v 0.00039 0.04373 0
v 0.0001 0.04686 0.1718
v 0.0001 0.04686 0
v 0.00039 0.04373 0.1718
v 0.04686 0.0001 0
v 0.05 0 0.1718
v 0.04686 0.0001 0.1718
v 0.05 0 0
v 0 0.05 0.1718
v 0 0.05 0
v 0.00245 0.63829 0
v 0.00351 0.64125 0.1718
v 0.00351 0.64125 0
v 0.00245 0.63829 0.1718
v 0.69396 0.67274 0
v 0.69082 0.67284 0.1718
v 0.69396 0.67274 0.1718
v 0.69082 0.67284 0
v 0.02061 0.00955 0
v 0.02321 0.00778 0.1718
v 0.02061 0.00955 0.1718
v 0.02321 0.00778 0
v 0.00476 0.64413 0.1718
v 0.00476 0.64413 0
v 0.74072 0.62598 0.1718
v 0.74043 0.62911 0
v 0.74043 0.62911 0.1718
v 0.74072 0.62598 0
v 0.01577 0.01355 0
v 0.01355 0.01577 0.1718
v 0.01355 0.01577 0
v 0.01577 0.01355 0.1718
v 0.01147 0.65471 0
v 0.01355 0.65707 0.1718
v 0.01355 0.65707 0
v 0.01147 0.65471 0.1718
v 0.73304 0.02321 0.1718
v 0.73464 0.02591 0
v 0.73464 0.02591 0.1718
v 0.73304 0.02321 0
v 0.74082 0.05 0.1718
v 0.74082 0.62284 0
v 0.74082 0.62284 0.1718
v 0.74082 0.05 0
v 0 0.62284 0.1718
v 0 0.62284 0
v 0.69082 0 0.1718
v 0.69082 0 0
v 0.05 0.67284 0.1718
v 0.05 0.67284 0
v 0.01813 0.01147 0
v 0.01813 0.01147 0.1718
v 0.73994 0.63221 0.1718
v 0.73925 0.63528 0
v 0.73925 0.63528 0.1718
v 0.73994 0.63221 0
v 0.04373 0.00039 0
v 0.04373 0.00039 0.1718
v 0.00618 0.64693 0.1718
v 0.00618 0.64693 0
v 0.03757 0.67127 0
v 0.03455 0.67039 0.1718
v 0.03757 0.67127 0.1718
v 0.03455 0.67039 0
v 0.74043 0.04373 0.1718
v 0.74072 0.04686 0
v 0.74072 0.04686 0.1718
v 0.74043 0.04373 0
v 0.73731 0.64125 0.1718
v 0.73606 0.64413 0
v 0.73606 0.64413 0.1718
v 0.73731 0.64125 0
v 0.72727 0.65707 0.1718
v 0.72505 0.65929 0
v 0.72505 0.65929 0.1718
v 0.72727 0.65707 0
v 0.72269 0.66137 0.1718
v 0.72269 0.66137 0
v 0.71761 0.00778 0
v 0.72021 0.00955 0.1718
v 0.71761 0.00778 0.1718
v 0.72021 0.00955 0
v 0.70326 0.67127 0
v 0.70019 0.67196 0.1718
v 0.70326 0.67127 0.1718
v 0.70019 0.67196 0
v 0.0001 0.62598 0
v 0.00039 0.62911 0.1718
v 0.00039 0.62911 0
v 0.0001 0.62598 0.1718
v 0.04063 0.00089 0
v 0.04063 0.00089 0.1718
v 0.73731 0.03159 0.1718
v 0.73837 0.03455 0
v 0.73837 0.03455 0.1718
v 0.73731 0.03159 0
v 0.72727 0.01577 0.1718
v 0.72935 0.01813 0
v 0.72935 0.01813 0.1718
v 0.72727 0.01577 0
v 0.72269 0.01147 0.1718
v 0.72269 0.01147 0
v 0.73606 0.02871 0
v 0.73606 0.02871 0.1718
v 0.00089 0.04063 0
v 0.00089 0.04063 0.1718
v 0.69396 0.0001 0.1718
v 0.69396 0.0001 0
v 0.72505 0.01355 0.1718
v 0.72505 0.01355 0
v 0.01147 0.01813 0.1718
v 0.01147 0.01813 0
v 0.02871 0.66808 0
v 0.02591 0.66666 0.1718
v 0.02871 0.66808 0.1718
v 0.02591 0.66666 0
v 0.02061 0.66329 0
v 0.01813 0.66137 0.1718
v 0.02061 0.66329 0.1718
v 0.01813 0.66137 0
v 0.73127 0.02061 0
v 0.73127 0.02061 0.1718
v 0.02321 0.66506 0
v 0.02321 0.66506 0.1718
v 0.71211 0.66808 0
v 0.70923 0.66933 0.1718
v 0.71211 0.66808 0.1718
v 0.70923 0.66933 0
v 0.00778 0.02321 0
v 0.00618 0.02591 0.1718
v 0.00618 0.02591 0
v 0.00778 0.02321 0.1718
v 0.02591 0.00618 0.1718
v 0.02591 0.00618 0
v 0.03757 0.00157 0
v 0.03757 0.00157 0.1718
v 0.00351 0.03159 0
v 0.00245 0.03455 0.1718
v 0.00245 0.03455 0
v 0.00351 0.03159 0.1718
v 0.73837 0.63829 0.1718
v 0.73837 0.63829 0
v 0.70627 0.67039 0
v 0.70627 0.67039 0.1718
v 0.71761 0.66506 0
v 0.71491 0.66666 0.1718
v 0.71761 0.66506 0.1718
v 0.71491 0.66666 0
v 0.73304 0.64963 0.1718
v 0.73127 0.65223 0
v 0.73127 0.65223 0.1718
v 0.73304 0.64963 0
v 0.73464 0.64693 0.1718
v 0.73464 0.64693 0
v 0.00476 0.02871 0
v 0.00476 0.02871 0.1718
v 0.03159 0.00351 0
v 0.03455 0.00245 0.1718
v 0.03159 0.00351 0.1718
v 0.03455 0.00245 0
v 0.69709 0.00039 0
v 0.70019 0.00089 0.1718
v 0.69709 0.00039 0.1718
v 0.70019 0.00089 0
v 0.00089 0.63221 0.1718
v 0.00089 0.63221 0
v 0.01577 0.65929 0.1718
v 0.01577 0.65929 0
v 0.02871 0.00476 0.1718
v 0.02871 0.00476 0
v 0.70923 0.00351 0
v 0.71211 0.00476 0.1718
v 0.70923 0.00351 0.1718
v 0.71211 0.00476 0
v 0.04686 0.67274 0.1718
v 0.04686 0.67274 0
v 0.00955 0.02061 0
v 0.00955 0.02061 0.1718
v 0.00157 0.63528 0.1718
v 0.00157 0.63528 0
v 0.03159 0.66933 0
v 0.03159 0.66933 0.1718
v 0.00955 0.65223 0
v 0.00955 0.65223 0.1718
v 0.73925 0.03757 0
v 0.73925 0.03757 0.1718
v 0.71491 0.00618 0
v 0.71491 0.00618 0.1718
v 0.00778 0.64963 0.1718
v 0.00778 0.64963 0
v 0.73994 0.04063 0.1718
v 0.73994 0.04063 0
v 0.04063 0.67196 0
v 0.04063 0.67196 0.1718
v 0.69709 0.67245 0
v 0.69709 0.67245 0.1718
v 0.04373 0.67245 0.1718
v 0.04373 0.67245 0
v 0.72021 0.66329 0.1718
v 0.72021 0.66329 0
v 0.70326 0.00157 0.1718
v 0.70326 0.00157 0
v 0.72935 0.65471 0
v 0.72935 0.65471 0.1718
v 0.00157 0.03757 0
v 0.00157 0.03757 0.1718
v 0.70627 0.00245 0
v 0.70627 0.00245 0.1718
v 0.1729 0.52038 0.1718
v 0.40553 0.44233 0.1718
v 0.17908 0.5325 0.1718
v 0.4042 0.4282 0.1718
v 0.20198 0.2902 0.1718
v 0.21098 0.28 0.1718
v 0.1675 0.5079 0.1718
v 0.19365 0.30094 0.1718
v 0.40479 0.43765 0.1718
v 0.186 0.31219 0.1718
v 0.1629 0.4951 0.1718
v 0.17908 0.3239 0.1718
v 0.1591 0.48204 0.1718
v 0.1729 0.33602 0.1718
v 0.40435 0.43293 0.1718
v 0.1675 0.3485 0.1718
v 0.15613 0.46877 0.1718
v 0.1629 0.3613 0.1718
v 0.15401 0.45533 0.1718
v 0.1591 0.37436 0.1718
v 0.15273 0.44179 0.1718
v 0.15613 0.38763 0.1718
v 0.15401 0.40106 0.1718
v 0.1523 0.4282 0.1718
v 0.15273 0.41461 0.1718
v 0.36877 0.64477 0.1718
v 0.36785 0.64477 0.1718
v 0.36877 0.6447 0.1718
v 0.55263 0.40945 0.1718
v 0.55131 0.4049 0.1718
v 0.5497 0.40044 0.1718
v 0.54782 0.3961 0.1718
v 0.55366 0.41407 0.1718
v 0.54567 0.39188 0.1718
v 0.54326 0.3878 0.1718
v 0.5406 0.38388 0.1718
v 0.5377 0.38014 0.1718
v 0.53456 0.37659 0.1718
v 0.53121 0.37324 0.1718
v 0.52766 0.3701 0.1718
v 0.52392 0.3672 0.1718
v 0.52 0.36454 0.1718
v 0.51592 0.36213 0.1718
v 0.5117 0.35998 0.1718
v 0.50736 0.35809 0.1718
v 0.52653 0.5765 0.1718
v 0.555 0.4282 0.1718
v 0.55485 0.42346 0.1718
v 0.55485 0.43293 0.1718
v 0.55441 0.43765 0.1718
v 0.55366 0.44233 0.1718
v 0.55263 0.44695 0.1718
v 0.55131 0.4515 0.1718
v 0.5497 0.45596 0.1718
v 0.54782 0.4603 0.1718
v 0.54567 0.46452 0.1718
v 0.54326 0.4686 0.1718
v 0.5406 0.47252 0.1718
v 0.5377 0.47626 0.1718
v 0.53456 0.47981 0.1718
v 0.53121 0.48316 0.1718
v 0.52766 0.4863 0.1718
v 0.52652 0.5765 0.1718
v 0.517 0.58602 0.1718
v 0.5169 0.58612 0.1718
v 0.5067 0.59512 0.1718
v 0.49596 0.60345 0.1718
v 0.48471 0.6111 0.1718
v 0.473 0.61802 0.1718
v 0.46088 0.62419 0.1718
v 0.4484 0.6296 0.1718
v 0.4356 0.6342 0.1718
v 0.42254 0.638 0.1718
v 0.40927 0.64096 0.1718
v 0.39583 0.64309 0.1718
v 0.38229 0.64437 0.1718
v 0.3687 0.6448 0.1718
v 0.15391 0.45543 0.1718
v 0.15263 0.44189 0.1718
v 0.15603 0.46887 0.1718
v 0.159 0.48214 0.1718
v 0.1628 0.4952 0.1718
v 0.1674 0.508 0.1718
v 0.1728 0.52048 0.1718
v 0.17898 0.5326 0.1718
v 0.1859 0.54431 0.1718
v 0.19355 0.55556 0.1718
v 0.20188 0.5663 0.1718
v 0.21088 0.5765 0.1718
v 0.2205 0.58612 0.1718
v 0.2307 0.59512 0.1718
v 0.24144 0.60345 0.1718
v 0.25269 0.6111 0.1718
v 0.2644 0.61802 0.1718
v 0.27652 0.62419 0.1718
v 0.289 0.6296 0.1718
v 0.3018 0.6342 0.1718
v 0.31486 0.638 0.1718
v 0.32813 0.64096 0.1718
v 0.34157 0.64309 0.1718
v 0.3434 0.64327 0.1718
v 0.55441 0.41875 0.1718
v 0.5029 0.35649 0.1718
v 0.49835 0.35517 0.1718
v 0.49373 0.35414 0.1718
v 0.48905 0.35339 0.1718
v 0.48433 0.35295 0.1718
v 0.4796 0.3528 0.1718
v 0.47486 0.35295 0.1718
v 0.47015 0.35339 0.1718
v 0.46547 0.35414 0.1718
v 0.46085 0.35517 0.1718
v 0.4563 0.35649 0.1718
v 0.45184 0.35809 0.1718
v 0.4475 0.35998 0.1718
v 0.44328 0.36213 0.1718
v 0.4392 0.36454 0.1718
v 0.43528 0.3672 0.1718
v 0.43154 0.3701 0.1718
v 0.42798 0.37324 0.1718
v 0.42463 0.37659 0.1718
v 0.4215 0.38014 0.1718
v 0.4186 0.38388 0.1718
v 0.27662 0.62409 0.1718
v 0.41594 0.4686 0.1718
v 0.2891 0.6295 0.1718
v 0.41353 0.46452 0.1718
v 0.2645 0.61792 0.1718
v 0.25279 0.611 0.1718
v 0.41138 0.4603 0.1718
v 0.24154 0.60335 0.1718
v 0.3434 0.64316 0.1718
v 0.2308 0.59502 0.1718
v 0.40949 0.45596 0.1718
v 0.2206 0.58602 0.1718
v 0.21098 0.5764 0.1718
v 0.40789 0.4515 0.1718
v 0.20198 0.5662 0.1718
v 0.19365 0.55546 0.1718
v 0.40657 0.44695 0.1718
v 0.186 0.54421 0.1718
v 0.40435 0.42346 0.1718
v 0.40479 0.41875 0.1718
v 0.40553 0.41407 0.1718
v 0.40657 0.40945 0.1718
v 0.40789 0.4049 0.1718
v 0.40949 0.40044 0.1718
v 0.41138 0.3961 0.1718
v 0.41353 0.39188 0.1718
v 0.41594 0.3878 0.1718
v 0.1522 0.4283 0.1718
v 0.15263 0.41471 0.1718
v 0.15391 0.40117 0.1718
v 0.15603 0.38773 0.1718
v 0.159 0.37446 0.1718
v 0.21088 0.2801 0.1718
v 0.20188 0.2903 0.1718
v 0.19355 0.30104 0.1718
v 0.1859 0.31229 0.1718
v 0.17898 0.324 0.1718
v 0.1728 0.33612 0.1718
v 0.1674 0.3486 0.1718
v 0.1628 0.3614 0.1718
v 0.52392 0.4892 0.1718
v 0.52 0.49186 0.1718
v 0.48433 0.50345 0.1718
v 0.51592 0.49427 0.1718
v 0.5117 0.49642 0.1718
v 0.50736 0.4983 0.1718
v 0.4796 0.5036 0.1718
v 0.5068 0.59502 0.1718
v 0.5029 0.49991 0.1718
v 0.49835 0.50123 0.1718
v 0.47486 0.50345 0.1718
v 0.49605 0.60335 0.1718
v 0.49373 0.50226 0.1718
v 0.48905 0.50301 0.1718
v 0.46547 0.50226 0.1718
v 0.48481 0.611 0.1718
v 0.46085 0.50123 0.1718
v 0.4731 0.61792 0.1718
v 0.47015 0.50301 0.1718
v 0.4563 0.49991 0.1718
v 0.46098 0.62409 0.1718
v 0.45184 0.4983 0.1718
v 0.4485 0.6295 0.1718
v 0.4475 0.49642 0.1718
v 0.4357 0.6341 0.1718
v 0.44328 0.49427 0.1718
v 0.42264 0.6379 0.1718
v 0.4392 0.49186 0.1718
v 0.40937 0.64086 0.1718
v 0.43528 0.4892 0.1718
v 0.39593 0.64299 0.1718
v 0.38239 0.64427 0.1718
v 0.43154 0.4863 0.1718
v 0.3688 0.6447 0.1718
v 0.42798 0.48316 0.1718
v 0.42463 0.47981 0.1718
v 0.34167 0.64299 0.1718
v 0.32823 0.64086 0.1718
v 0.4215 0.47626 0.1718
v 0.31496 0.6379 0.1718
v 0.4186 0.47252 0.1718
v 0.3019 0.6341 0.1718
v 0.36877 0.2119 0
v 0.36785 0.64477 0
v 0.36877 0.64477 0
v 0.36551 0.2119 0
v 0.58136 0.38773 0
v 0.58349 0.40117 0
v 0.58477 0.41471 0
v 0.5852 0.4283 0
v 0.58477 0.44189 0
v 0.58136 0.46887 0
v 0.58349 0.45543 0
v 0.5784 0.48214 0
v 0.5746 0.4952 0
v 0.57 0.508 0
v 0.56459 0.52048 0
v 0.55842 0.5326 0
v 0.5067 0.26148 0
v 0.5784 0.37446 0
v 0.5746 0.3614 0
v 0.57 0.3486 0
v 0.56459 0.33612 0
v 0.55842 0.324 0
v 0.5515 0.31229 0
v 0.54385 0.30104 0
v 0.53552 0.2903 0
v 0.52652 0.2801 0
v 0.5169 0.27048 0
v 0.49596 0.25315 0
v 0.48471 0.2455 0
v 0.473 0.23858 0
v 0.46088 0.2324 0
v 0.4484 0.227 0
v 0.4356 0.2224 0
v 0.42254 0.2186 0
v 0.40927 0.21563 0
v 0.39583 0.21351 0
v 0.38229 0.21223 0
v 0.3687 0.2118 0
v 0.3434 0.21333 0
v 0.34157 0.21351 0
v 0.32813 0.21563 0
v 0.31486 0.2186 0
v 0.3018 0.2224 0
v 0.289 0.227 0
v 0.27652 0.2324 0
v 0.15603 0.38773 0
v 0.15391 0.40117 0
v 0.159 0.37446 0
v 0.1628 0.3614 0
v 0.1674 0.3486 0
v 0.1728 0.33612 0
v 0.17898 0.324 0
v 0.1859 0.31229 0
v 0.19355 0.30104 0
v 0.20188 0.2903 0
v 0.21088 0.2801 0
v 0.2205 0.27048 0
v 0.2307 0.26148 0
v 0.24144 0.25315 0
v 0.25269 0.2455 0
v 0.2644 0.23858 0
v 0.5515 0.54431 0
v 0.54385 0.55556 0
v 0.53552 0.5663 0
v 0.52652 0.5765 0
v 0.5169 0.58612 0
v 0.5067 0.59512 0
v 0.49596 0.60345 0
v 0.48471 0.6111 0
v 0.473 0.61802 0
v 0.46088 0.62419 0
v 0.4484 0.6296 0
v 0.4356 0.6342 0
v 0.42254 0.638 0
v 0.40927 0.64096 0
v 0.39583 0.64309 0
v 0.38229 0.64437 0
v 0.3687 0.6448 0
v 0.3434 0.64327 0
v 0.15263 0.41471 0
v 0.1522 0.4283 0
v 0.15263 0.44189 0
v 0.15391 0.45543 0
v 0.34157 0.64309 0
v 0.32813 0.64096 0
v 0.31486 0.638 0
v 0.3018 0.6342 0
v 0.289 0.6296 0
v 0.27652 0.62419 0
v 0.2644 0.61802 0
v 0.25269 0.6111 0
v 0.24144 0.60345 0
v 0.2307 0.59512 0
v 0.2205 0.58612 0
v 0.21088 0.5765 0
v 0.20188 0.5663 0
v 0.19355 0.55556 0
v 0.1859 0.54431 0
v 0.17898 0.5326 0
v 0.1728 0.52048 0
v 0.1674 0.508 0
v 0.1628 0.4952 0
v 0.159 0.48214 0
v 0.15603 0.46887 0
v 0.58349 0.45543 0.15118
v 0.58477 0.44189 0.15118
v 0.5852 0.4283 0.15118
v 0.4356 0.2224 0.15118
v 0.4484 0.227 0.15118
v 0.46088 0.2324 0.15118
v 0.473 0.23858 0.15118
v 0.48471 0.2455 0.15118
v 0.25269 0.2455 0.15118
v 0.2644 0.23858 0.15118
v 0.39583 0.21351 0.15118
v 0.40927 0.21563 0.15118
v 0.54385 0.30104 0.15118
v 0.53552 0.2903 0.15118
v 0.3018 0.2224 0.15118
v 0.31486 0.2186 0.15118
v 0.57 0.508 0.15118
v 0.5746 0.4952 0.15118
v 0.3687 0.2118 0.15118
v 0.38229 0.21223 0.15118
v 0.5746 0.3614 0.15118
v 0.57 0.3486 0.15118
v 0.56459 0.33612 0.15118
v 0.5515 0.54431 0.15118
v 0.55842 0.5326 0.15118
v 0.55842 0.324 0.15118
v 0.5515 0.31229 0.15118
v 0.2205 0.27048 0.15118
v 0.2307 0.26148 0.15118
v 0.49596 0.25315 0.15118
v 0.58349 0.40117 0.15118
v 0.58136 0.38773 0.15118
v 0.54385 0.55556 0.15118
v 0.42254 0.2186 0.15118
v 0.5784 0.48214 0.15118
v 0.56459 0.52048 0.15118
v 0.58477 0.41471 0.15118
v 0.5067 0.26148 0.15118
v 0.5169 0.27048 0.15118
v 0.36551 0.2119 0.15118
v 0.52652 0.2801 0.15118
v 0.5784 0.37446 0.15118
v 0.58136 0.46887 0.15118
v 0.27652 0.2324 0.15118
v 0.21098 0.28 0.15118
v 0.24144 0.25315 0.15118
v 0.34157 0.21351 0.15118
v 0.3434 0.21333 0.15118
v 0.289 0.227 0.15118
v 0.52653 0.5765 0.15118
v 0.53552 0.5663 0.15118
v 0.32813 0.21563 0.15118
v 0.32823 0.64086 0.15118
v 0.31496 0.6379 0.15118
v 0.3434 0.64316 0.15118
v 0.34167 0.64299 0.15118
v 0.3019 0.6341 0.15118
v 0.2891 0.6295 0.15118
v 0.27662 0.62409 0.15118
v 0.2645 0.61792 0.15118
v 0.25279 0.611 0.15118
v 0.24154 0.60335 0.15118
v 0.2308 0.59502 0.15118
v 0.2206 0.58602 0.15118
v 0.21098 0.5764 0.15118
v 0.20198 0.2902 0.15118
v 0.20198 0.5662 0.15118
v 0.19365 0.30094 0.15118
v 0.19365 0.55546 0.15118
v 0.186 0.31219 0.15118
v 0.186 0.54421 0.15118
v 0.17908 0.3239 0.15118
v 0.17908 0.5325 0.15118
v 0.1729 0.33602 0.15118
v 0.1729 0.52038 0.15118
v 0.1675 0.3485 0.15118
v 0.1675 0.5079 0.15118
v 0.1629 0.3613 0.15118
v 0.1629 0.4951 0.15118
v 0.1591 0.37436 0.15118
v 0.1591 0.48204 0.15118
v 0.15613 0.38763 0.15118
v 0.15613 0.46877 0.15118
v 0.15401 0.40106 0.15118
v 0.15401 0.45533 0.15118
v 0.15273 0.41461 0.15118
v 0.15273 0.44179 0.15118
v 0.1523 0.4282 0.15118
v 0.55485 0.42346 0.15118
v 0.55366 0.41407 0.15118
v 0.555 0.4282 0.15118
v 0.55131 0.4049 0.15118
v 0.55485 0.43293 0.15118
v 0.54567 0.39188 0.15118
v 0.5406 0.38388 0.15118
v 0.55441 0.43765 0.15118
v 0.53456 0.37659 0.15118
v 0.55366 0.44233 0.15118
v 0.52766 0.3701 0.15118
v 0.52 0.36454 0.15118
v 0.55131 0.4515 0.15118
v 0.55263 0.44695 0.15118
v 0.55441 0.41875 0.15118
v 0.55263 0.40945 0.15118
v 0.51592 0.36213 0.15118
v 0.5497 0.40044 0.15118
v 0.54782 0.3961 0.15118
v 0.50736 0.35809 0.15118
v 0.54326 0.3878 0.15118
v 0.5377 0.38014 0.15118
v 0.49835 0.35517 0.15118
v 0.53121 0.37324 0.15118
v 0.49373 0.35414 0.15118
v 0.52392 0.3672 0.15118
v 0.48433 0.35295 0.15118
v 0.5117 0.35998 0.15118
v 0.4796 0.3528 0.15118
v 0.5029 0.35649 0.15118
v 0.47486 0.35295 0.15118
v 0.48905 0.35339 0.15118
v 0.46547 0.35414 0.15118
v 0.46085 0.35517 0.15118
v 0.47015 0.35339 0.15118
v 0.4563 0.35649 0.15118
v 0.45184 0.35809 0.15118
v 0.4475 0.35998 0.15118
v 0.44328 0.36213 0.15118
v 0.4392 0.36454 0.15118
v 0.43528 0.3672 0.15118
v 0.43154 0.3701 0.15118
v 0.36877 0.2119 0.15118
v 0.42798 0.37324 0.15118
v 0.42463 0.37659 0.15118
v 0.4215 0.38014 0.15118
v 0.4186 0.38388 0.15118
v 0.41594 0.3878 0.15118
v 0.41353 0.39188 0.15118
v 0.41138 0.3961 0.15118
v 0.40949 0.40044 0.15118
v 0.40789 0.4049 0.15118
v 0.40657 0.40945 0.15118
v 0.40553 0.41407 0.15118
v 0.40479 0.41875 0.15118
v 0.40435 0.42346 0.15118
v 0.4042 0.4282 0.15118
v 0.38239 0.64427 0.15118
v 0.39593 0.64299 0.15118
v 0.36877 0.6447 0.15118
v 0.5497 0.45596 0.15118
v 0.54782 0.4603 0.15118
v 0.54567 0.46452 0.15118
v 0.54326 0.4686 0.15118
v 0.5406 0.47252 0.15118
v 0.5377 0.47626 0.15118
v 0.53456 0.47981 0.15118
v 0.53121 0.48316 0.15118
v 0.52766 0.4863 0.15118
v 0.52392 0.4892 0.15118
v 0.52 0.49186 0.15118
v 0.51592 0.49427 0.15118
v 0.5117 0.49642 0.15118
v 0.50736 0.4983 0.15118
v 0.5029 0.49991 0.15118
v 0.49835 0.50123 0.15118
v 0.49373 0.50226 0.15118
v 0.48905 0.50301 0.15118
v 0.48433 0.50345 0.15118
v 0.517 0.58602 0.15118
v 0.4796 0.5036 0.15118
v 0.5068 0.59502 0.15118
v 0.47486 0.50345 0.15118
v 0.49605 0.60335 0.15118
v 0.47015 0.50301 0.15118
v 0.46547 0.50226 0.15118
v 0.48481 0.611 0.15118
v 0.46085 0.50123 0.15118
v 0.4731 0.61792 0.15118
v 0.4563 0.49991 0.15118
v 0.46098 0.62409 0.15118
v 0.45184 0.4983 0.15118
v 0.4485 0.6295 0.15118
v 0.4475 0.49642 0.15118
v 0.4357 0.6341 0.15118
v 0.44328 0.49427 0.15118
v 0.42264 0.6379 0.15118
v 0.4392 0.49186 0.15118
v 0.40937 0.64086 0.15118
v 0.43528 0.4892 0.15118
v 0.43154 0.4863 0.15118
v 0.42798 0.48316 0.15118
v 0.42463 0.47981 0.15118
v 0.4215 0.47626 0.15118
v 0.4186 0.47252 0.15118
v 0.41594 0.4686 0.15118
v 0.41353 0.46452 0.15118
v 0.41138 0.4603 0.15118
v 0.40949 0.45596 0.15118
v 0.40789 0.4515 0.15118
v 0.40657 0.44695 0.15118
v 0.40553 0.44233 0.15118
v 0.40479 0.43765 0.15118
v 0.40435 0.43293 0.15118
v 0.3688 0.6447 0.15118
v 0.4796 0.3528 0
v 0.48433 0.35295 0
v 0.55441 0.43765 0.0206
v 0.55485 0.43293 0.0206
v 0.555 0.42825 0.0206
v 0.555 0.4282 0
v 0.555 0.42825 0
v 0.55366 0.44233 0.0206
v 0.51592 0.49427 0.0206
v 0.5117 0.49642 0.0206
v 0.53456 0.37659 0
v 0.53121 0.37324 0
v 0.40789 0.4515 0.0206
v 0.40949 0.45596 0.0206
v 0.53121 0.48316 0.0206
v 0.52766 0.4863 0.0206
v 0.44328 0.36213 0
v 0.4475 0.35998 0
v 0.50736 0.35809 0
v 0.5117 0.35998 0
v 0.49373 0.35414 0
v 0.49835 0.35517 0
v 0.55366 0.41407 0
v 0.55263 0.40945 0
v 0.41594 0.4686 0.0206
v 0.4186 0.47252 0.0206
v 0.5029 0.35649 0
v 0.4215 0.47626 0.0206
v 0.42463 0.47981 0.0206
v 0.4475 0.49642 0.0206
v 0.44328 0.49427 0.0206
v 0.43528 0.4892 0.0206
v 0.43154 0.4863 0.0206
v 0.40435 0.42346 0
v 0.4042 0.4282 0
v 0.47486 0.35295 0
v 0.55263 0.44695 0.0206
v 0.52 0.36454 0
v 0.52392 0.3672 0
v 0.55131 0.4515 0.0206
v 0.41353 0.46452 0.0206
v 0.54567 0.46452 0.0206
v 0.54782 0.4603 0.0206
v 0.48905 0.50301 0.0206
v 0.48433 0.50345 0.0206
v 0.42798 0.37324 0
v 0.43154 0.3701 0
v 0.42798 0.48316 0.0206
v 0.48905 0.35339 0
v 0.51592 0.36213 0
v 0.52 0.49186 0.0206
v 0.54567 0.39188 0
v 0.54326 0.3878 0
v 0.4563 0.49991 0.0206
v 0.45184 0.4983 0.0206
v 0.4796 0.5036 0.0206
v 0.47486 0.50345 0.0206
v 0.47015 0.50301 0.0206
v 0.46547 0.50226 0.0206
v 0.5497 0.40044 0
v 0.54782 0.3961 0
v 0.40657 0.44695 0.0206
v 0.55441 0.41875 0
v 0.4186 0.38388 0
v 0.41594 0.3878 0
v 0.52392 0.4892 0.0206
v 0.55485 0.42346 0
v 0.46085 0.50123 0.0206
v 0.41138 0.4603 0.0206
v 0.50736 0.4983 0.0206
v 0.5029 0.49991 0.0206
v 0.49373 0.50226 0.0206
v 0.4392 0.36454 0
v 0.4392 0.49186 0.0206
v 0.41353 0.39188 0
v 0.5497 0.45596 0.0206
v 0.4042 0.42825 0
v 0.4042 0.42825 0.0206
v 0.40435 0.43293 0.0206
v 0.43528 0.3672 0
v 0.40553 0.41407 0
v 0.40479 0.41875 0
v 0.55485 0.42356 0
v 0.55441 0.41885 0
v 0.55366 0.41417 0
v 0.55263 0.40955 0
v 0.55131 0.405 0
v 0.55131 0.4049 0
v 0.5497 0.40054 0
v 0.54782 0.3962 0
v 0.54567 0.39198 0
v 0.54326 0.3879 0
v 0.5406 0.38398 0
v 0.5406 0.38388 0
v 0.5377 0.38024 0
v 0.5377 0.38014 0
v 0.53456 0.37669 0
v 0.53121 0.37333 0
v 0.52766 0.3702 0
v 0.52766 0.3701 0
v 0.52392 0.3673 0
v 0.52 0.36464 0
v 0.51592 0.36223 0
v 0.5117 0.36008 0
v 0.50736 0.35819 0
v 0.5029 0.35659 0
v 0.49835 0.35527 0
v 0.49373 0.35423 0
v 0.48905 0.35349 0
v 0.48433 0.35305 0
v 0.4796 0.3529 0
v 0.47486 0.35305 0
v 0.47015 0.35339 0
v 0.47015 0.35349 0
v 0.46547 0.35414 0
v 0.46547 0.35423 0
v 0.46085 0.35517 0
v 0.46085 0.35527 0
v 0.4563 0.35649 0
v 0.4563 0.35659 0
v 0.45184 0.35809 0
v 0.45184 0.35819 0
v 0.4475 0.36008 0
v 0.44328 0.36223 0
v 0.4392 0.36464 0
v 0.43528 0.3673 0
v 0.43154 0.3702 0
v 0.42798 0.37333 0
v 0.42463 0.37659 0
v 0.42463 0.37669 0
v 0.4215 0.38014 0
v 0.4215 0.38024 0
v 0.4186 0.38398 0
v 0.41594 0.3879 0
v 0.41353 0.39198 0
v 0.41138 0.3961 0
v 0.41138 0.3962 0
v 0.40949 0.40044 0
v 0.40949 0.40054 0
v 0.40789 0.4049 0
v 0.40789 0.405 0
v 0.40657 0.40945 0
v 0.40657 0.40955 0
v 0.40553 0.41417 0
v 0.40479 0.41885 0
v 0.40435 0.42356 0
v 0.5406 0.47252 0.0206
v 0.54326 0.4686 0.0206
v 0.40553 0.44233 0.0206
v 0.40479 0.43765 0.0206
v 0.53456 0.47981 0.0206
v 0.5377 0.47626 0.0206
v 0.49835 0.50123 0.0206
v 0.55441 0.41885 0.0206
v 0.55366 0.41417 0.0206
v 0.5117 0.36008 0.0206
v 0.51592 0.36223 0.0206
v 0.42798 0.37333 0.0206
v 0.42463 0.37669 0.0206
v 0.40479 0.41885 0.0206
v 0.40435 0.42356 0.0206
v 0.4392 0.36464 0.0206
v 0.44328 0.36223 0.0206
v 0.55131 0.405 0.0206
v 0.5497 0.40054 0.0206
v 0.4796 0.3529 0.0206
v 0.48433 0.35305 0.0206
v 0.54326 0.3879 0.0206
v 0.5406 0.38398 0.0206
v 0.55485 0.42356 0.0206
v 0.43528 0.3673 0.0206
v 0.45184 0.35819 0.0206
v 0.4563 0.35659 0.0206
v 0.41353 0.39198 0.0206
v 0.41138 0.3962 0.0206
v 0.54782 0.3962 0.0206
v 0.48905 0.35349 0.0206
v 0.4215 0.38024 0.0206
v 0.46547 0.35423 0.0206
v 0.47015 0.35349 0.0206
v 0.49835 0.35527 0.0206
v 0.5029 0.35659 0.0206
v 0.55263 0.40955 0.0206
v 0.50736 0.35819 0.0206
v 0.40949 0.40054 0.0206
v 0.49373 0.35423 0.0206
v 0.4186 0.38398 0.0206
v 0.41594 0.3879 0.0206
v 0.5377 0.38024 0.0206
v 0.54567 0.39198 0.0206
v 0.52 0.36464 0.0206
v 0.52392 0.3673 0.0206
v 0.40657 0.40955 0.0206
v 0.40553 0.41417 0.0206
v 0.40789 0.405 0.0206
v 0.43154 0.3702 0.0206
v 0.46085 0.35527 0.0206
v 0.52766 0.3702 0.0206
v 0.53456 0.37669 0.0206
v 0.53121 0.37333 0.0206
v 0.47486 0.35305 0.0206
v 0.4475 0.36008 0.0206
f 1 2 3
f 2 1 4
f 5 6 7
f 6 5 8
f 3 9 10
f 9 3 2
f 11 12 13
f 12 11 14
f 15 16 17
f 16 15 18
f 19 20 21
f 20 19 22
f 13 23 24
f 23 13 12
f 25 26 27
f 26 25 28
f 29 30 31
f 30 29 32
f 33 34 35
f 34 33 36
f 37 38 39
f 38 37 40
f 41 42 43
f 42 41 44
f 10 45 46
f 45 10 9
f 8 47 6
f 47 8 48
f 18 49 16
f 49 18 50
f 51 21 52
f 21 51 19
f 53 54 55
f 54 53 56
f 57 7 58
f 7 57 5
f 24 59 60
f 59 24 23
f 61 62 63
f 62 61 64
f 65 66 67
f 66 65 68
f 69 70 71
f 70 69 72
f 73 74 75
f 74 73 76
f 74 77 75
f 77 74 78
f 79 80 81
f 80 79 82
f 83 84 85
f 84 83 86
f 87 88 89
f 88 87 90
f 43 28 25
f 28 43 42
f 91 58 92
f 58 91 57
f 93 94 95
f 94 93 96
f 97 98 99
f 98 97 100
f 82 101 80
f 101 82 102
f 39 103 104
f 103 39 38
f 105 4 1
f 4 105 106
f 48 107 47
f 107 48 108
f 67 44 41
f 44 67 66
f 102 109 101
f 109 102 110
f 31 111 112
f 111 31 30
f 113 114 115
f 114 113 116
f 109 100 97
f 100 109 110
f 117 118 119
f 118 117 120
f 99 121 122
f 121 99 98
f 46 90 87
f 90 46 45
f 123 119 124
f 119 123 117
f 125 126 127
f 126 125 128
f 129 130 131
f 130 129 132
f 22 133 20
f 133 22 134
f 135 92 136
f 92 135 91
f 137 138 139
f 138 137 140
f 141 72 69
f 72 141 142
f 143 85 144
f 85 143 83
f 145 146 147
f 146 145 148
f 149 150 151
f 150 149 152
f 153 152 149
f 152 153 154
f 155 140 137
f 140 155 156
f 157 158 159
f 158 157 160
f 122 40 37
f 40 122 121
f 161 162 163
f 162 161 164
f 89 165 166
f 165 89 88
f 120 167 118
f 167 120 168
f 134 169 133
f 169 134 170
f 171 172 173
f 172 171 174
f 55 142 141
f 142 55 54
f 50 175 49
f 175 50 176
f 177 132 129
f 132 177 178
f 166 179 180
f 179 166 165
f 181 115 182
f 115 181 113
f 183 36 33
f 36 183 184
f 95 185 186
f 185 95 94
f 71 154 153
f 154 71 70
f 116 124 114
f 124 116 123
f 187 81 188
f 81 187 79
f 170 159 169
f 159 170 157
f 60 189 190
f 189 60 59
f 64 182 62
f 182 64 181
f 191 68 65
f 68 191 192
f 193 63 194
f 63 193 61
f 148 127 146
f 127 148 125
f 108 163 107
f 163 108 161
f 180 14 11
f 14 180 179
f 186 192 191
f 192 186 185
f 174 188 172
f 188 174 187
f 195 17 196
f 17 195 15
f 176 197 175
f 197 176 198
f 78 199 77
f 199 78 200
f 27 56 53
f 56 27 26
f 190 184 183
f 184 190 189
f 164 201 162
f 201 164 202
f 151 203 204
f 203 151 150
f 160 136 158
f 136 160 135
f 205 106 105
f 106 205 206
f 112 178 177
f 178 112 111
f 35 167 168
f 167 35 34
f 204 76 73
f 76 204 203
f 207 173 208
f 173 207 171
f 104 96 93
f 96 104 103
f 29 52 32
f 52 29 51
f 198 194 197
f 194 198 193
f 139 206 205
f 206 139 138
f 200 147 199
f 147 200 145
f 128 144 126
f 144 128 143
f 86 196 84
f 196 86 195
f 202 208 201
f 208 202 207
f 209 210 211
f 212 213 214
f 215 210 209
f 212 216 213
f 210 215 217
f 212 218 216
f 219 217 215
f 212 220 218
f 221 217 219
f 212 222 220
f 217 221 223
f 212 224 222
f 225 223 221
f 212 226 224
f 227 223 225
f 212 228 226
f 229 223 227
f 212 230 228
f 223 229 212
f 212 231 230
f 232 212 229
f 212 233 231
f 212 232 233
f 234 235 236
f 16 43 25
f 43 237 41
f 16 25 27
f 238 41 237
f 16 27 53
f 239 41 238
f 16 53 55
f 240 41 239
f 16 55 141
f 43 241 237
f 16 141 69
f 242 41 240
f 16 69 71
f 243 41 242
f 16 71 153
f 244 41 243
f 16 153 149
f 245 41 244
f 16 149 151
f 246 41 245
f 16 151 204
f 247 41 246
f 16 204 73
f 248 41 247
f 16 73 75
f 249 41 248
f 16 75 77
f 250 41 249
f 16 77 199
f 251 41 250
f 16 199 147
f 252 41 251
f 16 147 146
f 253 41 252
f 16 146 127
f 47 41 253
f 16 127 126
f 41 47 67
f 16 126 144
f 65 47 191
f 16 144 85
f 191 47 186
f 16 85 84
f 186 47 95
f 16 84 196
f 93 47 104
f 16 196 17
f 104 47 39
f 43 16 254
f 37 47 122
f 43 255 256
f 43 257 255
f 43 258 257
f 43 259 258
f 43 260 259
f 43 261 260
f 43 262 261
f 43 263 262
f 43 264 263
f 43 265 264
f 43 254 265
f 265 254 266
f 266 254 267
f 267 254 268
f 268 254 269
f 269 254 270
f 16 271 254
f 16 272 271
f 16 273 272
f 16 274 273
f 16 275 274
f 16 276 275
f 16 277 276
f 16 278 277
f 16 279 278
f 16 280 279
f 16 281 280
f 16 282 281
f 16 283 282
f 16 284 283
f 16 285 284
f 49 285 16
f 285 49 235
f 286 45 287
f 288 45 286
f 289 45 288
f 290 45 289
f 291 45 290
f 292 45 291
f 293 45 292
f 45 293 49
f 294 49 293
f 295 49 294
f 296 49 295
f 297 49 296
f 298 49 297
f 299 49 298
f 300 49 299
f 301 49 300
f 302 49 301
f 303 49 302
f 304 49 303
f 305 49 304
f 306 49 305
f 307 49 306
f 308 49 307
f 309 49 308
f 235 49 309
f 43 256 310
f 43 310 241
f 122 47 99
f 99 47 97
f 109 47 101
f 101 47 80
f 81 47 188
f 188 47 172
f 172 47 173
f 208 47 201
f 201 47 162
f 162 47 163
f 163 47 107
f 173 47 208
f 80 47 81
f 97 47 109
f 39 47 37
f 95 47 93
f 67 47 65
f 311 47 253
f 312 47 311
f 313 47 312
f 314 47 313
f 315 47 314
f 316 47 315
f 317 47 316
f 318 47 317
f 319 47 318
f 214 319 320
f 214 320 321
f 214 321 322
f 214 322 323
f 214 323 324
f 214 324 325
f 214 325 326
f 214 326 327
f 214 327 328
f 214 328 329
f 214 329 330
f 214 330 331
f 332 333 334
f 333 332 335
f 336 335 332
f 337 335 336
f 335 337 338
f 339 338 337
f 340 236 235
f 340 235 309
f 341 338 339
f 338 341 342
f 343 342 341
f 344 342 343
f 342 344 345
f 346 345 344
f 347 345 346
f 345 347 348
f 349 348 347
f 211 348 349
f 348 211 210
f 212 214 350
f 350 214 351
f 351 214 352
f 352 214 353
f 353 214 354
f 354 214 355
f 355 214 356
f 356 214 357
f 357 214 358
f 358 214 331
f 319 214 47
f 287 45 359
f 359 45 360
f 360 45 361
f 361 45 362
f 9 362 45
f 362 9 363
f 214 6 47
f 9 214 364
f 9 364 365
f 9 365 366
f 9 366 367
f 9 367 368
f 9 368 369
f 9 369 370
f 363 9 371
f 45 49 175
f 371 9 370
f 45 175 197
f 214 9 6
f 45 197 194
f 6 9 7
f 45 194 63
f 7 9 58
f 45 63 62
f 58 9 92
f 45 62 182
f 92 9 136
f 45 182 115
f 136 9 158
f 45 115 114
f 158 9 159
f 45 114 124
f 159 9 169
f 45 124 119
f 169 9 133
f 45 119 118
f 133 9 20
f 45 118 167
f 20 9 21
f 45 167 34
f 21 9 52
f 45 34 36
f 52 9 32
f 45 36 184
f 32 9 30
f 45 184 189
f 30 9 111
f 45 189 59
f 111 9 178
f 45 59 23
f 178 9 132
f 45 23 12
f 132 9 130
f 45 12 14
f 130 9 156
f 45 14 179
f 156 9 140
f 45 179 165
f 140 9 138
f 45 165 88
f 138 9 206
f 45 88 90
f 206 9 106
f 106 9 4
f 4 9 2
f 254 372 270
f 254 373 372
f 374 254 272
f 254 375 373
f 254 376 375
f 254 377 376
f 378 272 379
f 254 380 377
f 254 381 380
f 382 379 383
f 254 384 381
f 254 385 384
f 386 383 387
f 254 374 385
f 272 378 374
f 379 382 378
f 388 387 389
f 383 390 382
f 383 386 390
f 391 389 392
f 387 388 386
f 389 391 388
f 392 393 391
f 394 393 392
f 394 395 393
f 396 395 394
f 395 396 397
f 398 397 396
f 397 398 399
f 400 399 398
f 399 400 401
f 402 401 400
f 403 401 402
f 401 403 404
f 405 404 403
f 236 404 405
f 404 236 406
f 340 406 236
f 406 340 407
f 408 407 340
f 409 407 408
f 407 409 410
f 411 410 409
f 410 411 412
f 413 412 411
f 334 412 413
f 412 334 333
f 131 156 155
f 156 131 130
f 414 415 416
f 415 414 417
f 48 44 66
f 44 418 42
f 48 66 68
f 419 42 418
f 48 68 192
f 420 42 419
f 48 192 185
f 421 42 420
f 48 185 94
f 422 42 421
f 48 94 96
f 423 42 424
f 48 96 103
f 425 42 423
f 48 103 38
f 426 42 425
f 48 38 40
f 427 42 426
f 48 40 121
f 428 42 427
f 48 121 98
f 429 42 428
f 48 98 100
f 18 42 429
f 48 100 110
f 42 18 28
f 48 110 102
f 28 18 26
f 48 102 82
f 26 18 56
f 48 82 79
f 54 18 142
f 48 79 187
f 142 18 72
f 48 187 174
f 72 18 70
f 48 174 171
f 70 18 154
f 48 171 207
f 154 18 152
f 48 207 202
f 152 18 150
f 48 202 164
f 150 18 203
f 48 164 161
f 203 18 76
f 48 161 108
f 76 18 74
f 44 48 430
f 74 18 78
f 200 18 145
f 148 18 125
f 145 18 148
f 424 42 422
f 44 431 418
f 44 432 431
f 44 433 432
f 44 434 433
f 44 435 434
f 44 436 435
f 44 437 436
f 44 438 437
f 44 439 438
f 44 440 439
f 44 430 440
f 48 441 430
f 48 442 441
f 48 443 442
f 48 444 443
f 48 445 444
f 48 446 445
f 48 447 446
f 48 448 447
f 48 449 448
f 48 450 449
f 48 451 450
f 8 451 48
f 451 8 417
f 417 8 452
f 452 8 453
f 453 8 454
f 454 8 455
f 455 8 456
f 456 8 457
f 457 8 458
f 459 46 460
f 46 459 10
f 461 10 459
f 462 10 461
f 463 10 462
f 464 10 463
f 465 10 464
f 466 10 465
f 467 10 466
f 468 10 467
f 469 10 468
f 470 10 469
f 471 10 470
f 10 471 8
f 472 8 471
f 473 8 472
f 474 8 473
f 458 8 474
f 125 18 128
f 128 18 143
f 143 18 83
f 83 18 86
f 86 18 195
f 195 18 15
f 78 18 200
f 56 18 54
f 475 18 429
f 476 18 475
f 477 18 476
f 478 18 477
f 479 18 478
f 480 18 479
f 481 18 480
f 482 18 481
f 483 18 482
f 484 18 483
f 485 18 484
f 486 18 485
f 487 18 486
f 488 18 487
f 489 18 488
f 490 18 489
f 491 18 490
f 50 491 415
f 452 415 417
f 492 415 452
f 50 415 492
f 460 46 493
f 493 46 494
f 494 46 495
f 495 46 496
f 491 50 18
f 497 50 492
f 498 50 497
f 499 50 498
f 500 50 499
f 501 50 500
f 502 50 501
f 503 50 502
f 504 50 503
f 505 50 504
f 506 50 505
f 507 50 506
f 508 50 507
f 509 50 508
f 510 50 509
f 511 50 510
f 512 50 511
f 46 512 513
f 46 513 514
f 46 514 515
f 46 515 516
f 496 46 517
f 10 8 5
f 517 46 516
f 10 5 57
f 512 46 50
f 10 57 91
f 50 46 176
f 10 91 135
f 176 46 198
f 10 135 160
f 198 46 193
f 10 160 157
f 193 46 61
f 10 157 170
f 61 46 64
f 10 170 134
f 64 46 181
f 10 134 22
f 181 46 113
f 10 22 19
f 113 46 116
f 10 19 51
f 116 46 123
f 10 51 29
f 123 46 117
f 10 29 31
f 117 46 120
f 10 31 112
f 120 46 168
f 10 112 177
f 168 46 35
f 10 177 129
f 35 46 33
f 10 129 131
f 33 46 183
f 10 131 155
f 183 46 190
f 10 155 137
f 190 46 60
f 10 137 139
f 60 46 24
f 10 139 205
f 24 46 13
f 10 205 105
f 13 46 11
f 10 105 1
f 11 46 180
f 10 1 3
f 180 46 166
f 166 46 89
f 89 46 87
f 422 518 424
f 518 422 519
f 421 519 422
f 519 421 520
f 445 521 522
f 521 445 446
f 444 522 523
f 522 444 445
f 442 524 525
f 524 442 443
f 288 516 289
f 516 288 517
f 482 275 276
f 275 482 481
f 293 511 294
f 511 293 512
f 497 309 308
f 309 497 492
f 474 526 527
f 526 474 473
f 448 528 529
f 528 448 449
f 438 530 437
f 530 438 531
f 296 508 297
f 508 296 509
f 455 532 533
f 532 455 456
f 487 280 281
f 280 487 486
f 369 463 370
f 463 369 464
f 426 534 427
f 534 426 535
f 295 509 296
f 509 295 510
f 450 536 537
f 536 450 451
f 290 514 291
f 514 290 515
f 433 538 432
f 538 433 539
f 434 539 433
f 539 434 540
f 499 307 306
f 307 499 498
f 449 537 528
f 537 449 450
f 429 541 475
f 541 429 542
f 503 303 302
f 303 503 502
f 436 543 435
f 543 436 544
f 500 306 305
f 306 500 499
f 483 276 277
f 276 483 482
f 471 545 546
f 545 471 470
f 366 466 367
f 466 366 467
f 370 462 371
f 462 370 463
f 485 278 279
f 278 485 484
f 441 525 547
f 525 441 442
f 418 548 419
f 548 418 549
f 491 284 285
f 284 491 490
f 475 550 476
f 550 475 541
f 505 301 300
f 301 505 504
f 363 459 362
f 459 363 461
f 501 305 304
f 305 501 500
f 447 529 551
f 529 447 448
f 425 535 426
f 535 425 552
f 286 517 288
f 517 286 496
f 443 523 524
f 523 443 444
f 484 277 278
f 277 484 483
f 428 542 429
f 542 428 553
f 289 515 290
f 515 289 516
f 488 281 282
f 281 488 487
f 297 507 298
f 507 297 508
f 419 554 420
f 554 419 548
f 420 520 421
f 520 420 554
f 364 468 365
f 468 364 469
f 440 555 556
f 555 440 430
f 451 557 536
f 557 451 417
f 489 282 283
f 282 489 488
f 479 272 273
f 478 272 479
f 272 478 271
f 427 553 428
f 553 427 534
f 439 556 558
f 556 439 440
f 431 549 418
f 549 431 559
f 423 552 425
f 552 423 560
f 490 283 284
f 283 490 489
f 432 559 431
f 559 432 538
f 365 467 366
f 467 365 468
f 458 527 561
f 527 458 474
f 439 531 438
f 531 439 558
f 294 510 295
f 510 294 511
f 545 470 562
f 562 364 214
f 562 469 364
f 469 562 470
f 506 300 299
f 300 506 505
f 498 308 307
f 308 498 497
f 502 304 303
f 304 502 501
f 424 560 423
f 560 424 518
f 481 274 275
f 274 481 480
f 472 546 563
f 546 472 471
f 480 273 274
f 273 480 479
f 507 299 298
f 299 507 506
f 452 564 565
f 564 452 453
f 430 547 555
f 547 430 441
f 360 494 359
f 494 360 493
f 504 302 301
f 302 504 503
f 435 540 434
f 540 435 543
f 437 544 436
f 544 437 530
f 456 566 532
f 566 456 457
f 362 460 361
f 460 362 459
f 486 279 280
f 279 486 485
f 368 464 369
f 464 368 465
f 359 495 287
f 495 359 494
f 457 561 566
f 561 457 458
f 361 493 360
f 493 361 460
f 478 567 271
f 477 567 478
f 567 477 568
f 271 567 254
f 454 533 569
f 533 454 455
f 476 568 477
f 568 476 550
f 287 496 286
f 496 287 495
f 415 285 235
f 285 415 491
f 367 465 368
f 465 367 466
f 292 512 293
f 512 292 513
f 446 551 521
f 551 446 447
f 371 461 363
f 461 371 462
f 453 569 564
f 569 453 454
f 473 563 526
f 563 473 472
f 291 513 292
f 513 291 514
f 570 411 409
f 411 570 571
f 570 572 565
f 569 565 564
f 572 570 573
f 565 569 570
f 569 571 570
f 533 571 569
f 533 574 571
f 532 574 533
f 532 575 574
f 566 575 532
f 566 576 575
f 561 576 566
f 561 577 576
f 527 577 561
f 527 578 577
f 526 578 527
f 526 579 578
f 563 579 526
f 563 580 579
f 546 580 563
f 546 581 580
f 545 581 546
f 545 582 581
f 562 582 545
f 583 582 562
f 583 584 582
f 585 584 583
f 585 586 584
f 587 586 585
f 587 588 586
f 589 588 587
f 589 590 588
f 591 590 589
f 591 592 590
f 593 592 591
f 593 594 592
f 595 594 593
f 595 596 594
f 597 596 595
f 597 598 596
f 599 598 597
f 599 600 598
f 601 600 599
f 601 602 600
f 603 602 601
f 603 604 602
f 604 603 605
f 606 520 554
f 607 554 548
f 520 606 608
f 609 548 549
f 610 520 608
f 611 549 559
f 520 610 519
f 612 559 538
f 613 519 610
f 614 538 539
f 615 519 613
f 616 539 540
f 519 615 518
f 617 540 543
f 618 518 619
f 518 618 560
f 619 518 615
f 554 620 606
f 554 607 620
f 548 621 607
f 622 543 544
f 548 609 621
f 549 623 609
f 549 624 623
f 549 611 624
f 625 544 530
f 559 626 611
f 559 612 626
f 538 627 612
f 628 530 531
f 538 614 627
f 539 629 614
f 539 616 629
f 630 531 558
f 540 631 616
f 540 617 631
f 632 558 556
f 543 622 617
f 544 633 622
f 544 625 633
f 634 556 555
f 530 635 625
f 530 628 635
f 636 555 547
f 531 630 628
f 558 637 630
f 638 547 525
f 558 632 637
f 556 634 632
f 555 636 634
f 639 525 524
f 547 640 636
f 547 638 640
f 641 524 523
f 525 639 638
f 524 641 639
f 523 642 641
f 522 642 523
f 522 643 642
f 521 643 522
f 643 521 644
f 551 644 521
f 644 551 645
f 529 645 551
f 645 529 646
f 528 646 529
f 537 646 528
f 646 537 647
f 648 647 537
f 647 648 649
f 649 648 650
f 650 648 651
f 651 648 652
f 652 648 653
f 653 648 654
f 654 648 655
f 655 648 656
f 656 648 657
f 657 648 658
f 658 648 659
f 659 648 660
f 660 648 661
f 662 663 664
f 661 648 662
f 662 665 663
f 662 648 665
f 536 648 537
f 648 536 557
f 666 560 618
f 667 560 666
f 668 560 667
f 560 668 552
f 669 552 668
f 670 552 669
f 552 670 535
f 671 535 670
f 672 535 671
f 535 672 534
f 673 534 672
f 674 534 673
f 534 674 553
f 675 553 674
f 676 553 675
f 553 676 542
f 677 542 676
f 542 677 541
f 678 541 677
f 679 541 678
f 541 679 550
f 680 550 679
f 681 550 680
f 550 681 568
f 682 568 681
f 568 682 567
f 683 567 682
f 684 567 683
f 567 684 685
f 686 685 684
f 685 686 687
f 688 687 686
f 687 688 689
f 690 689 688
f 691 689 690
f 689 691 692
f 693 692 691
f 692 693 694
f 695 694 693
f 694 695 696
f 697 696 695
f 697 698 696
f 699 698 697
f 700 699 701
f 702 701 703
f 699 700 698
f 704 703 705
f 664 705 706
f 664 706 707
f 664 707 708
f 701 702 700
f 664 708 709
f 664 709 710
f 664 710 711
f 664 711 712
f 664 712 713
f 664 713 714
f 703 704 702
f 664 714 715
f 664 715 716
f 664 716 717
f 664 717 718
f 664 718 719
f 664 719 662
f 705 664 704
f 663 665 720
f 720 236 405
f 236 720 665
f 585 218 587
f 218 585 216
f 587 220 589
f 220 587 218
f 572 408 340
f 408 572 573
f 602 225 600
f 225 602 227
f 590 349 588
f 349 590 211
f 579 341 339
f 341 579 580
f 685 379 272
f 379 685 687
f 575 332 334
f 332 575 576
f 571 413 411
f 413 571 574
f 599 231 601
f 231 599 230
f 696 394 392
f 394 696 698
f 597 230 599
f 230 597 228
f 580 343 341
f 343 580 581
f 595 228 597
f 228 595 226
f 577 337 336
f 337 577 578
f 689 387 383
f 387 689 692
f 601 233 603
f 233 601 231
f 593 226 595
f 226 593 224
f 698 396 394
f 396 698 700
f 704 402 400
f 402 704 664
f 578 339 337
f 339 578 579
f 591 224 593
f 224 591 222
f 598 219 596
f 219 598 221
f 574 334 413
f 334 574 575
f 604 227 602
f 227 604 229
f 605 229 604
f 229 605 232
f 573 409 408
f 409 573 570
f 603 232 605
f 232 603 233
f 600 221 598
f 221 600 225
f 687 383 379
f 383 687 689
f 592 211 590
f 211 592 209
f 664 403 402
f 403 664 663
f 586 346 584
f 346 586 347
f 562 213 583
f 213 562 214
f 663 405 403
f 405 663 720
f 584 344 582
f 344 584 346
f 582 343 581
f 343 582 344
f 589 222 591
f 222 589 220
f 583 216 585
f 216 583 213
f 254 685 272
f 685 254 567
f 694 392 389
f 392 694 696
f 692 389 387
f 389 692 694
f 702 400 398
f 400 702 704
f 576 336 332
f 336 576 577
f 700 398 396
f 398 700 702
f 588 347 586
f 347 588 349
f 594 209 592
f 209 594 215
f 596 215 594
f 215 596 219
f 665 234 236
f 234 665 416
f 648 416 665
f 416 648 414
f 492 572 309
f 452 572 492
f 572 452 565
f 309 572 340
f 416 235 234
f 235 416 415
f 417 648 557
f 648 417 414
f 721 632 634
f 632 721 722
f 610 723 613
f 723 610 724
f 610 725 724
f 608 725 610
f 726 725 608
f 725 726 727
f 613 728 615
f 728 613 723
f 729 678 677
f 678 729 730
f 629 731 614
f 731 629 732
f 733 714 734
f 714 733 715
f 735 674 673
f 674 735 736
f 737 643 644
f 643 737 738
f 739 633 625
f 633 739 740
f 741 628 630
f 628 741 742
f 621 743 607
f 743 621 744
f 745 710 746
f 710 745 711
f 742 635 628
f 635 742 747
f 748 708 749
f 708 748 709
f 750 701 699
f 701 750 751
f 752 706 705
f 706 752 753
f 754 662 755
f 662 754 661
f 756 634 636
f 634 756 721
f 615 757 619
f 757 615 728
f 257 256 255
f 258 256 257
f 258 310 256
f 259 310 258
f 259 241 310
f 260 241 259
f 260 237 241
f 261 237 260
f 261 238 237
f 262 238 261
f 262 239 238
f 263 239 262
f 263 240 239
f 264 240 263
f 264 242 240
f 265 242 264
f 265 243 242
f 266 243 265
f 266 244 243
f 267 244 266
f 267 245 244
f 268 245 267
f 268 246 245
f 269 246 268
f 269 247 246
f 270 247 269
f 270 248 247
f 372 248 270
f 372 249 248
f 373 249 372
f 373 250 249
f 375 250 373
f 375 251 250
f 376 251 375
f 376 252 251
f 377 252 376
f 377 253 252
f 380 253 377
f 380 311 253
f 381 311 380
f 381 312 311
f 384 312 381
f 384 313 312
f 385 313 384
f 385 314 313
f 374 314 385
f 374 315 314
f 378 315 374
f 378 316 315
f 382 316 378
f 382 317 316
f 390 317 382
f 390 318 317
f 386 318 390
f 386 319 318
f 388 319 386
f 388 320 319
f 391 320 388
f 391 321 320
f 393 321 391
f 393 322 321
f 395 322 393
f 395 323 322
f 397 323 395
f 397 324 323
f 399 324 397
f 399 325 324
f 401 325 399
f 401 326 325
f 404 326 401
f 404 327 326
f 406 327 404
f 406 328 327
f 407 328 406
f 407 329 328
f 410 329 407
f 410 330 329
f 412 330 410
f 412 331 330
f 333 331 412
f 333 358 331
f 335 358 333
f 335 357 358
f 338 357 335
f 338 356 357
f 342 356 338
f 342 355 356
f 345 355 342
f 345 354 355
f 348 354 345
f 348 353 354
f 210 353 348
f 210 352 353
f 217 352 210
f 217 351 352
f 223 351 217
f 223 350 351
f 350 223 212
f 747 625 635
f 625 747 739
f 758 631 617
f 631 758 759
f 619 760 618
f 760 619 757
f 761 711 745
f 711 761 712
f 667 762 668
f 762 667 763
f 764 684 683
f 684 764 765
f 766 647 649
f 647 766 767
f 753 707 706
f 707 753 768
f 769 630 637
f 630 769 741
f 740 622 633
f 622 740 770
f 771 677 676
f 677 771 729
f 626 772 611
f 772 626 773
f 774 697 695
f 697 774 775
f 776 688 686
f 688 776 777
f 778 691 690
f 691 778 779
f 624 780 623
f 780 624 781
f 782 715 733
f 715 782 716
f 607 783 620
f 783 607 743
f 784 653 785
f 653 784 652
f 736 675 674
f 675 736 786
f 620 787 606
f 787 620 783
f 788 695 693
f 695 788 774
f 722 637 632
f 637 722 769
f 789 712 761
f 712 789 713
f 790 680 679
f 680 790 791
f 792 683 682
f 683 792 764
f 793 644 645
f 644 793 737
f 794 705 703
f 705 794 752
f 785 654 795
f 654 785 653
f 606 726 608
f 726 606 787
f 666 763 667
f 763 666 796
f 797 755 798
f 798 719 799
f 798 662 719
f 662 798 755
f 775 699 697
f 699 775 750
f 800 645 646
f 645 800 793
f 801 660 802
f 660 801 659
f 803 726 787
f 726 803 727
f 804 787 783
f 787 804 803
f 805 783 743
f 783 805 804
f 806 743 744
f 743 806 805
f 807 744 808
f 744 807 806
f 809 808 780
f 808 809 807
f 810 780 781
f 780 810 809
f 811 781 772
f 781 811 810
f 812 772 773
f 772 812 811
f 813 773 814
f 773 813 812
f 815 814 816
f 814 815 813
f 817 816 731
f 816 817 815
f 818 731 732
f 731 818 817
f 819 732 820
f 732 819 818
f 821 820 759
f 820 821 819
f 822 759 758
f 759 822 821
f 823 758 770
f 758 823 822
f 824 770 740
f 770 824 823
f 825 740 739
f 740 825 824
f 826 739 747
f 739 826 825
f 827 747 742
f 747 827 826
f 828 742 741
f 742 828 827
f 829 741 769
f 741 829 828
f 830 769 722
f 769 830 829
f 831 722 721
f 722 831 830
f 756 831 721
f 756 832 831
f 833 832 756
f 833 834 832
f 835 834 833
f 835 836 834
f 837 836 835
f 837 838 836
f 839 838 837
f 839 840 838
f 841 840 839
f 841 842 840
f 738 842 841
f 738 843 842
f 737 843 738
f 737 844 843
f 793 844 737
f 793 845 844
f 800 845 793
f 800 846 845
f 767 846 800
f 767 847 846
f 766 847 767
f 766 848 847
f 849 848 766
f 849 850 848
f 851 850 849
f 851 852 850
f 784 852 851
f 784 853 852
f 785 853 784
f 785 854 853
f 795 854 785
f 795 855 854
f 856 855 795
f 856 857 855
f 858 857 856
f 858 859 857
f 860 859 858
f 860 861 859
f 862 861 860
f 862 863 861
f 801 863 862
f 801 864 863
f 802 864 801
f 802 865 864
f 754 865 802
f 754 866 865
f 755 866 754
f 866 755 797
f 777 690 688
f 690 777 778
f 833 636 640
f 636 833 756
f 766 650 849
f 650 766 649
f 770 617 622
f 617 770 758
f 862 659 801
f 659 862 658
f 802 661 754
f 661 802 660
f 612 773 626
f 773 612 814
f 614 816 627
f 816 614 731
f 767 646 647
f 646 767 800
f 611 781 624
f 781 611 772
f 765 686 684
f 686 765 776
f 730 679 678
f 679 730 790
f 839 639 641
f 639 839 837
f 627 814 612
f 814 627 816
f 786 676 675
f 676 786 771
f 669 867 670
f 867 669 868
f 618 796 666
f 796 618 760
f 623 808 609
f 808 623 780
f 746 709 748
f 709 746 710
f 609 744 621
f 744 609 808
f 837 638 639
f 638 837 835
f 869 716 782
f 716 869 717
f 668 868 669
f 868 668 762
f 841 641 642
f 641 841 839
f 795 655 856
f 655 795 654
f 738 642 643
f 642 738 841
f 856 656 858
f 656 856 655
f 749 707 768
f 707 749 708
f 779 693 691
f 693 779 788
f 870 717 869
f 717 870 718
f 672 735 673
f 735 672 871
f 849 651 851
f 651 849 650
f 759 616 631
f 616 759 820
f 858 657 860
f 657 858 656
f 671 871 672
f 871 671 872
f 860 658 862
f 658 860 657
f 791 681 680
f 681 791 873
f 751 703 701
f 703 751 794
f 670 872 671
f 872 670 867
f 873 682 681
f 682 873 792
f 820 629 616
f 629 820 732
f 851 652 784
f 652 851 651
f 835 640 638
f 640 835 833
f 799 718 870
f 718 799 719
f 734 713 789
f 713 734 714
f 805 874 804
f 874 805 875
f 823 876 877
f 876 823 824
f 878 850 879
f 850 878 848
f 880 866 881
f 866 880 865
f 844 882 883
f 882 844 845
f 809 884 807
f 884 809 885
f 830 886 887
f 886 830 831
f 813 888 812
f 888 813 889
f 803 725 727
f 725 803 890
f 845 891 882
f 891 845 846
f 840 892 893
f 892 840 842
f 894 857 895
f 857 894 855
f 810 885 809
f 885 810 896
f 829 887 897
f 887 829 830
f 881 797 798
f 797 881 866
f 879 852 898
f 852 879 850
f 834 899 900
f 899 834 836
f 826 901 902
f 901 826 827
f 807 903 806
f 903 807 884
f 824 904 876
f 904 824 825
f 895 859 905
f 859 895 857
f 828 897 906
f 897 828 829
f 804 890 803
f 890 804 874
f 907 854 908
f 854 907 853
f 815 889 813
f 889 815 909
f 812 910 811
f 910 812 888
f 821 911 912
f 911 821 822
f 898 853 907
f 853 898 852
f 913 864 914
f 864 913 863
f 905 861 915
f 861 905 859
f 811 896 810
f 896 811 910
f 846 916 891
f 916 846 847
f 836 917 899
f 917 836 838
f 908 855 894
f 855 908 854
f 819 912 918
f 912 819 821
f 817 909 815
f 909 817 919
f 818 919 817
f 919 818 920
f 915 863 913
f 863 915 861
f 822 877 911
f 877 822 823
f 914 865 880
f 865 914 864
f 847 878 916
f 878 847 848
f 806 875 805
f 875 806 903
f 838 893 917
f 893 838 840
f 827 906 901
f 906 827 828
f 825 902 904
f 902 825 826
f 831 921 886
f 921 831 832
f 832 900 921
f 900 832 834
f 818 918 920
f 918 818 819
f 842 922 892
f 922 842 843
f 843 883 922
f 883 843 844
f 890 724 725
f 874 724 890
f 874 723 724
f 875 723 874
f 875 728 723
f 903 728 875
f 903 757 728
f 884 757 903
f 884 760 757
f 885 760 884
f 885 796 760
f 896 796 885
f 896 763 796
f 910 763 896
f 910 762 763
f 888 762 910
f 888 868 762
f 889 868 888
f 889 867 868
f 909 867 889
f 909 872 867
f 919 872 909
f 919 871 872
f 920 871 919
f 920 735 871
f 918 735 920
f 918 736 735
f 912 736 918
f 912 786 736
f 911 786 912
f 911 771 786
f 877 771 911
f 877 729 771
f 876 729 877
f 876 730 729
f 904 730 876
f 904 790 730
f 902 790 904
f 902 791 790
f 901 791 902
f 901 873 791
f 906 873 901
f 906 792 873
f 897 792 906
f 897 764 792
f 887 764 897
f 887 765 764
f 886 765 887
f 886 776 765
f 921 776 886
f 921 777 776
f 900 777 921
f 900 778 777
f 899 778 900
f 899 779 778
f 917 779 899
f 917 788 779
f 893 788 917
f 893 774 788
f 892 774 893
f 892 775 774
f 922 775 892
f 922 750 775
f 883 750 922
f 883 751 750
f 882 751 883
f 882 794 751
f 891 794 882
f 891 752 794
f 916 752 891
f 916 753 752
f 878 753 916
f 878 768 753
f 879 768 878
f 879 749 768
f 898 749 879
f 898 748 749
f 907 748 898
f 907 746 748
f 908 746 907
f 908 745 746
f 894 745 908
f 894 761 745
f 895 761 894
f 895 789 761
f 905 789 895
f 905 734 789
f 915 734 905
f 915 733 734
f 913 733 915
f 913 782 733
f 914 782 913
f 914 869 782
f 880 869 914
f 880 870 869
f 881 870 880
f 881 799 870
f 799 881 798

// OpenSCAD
// Parameters for the CAD model
// All dimensions are in the provided units

// Main Base Parameters
base_length = 0.740822;
base_width = 0.672842;
base_height = 0.171797;
base_corner_radius = 0.05; // Estimated radius for the rounded outer perimeter

// Central Circular Through Opening
hole_x = 0.3687;
hole_y = 0.4283;
hole_r = 0.2165;

// Shallow Circular Upper Feature
shallow_x = 0.3688;
shallow_y = 0.4282;
shallow_r = 0.2165;
shallow_h = 0.020616;

// Narrow Straight Solid Web
web_x = 0.3434;
web_y = 0.2119;
web_l = 0.025368;
web_w = 0.432873;
web_h = 0.171797;

// Smaller Round Solid Feature
small_x = 0.4796;
small_y = 0.4282;
small_r = 0.0754;
small_h = 0.1718;

// Circular Removed Recess/Opening
recess_x = 0.4796;
recess_y = 0.4283;
recess_r = 0.0754;
recess_z_start = -0.1512;
recess_z_end = 0.0206;

// Resolution for smooth curved surfaces
$fn = 100;

// Reusable module for the main rounded base footprint
module rounded_wedge_base(l, w, h, r) {
    linear_extrude(height = h) {
        hull() {
            translate([r, r]) circle(r);
            translate([l - r, r]) circle(r);
            translate([l - r, w - r]) circle(r);
            translate([r, w - r]) circle(r);
        }
    }
}

// Main Model Assembly
difference() {
    union() {
        // 1. Main rounded wedge base with the central hole removed
        difference() {
            rounded_wedge_base(base_length, base_width, base_height, base_corner_radius);
            
            // Central circular through opening
            translate([hole_x, hole_y, -0.1])
                cylinder(h = base_height + 0.2, r = hole_r);
        }
        
        // 2. Shallow circular upper feature
        // Added as solid material at the top of the central opening
        translate([shallow_x, shallow_y, base_height - shallow_h])
            cylinder(h = shallow_h, r = shallow_r);
            
        // 3. Narrow straight solid web crossing the central opening
        translate([web_x, web_y, 0])
            cube([web_l, web_w, web_h]);
            
        // 4. Smaller round solid feature
        translate([small_x, small_y, 0])
            cylinder(h = small_h, r = small_r);
    }
    
    // 5. Circular removed recess/opening
    // This removes the bottom portion (Z=0 to 0.0206) of the smaller round solid feature,
    // leaving a stepped hanging pad of depth 0.1512.
    translate([recess_x, recess_y, recess_z_start])
        cylinder(h = recess_z_end - recess_z_start, r = recess_r);
}
